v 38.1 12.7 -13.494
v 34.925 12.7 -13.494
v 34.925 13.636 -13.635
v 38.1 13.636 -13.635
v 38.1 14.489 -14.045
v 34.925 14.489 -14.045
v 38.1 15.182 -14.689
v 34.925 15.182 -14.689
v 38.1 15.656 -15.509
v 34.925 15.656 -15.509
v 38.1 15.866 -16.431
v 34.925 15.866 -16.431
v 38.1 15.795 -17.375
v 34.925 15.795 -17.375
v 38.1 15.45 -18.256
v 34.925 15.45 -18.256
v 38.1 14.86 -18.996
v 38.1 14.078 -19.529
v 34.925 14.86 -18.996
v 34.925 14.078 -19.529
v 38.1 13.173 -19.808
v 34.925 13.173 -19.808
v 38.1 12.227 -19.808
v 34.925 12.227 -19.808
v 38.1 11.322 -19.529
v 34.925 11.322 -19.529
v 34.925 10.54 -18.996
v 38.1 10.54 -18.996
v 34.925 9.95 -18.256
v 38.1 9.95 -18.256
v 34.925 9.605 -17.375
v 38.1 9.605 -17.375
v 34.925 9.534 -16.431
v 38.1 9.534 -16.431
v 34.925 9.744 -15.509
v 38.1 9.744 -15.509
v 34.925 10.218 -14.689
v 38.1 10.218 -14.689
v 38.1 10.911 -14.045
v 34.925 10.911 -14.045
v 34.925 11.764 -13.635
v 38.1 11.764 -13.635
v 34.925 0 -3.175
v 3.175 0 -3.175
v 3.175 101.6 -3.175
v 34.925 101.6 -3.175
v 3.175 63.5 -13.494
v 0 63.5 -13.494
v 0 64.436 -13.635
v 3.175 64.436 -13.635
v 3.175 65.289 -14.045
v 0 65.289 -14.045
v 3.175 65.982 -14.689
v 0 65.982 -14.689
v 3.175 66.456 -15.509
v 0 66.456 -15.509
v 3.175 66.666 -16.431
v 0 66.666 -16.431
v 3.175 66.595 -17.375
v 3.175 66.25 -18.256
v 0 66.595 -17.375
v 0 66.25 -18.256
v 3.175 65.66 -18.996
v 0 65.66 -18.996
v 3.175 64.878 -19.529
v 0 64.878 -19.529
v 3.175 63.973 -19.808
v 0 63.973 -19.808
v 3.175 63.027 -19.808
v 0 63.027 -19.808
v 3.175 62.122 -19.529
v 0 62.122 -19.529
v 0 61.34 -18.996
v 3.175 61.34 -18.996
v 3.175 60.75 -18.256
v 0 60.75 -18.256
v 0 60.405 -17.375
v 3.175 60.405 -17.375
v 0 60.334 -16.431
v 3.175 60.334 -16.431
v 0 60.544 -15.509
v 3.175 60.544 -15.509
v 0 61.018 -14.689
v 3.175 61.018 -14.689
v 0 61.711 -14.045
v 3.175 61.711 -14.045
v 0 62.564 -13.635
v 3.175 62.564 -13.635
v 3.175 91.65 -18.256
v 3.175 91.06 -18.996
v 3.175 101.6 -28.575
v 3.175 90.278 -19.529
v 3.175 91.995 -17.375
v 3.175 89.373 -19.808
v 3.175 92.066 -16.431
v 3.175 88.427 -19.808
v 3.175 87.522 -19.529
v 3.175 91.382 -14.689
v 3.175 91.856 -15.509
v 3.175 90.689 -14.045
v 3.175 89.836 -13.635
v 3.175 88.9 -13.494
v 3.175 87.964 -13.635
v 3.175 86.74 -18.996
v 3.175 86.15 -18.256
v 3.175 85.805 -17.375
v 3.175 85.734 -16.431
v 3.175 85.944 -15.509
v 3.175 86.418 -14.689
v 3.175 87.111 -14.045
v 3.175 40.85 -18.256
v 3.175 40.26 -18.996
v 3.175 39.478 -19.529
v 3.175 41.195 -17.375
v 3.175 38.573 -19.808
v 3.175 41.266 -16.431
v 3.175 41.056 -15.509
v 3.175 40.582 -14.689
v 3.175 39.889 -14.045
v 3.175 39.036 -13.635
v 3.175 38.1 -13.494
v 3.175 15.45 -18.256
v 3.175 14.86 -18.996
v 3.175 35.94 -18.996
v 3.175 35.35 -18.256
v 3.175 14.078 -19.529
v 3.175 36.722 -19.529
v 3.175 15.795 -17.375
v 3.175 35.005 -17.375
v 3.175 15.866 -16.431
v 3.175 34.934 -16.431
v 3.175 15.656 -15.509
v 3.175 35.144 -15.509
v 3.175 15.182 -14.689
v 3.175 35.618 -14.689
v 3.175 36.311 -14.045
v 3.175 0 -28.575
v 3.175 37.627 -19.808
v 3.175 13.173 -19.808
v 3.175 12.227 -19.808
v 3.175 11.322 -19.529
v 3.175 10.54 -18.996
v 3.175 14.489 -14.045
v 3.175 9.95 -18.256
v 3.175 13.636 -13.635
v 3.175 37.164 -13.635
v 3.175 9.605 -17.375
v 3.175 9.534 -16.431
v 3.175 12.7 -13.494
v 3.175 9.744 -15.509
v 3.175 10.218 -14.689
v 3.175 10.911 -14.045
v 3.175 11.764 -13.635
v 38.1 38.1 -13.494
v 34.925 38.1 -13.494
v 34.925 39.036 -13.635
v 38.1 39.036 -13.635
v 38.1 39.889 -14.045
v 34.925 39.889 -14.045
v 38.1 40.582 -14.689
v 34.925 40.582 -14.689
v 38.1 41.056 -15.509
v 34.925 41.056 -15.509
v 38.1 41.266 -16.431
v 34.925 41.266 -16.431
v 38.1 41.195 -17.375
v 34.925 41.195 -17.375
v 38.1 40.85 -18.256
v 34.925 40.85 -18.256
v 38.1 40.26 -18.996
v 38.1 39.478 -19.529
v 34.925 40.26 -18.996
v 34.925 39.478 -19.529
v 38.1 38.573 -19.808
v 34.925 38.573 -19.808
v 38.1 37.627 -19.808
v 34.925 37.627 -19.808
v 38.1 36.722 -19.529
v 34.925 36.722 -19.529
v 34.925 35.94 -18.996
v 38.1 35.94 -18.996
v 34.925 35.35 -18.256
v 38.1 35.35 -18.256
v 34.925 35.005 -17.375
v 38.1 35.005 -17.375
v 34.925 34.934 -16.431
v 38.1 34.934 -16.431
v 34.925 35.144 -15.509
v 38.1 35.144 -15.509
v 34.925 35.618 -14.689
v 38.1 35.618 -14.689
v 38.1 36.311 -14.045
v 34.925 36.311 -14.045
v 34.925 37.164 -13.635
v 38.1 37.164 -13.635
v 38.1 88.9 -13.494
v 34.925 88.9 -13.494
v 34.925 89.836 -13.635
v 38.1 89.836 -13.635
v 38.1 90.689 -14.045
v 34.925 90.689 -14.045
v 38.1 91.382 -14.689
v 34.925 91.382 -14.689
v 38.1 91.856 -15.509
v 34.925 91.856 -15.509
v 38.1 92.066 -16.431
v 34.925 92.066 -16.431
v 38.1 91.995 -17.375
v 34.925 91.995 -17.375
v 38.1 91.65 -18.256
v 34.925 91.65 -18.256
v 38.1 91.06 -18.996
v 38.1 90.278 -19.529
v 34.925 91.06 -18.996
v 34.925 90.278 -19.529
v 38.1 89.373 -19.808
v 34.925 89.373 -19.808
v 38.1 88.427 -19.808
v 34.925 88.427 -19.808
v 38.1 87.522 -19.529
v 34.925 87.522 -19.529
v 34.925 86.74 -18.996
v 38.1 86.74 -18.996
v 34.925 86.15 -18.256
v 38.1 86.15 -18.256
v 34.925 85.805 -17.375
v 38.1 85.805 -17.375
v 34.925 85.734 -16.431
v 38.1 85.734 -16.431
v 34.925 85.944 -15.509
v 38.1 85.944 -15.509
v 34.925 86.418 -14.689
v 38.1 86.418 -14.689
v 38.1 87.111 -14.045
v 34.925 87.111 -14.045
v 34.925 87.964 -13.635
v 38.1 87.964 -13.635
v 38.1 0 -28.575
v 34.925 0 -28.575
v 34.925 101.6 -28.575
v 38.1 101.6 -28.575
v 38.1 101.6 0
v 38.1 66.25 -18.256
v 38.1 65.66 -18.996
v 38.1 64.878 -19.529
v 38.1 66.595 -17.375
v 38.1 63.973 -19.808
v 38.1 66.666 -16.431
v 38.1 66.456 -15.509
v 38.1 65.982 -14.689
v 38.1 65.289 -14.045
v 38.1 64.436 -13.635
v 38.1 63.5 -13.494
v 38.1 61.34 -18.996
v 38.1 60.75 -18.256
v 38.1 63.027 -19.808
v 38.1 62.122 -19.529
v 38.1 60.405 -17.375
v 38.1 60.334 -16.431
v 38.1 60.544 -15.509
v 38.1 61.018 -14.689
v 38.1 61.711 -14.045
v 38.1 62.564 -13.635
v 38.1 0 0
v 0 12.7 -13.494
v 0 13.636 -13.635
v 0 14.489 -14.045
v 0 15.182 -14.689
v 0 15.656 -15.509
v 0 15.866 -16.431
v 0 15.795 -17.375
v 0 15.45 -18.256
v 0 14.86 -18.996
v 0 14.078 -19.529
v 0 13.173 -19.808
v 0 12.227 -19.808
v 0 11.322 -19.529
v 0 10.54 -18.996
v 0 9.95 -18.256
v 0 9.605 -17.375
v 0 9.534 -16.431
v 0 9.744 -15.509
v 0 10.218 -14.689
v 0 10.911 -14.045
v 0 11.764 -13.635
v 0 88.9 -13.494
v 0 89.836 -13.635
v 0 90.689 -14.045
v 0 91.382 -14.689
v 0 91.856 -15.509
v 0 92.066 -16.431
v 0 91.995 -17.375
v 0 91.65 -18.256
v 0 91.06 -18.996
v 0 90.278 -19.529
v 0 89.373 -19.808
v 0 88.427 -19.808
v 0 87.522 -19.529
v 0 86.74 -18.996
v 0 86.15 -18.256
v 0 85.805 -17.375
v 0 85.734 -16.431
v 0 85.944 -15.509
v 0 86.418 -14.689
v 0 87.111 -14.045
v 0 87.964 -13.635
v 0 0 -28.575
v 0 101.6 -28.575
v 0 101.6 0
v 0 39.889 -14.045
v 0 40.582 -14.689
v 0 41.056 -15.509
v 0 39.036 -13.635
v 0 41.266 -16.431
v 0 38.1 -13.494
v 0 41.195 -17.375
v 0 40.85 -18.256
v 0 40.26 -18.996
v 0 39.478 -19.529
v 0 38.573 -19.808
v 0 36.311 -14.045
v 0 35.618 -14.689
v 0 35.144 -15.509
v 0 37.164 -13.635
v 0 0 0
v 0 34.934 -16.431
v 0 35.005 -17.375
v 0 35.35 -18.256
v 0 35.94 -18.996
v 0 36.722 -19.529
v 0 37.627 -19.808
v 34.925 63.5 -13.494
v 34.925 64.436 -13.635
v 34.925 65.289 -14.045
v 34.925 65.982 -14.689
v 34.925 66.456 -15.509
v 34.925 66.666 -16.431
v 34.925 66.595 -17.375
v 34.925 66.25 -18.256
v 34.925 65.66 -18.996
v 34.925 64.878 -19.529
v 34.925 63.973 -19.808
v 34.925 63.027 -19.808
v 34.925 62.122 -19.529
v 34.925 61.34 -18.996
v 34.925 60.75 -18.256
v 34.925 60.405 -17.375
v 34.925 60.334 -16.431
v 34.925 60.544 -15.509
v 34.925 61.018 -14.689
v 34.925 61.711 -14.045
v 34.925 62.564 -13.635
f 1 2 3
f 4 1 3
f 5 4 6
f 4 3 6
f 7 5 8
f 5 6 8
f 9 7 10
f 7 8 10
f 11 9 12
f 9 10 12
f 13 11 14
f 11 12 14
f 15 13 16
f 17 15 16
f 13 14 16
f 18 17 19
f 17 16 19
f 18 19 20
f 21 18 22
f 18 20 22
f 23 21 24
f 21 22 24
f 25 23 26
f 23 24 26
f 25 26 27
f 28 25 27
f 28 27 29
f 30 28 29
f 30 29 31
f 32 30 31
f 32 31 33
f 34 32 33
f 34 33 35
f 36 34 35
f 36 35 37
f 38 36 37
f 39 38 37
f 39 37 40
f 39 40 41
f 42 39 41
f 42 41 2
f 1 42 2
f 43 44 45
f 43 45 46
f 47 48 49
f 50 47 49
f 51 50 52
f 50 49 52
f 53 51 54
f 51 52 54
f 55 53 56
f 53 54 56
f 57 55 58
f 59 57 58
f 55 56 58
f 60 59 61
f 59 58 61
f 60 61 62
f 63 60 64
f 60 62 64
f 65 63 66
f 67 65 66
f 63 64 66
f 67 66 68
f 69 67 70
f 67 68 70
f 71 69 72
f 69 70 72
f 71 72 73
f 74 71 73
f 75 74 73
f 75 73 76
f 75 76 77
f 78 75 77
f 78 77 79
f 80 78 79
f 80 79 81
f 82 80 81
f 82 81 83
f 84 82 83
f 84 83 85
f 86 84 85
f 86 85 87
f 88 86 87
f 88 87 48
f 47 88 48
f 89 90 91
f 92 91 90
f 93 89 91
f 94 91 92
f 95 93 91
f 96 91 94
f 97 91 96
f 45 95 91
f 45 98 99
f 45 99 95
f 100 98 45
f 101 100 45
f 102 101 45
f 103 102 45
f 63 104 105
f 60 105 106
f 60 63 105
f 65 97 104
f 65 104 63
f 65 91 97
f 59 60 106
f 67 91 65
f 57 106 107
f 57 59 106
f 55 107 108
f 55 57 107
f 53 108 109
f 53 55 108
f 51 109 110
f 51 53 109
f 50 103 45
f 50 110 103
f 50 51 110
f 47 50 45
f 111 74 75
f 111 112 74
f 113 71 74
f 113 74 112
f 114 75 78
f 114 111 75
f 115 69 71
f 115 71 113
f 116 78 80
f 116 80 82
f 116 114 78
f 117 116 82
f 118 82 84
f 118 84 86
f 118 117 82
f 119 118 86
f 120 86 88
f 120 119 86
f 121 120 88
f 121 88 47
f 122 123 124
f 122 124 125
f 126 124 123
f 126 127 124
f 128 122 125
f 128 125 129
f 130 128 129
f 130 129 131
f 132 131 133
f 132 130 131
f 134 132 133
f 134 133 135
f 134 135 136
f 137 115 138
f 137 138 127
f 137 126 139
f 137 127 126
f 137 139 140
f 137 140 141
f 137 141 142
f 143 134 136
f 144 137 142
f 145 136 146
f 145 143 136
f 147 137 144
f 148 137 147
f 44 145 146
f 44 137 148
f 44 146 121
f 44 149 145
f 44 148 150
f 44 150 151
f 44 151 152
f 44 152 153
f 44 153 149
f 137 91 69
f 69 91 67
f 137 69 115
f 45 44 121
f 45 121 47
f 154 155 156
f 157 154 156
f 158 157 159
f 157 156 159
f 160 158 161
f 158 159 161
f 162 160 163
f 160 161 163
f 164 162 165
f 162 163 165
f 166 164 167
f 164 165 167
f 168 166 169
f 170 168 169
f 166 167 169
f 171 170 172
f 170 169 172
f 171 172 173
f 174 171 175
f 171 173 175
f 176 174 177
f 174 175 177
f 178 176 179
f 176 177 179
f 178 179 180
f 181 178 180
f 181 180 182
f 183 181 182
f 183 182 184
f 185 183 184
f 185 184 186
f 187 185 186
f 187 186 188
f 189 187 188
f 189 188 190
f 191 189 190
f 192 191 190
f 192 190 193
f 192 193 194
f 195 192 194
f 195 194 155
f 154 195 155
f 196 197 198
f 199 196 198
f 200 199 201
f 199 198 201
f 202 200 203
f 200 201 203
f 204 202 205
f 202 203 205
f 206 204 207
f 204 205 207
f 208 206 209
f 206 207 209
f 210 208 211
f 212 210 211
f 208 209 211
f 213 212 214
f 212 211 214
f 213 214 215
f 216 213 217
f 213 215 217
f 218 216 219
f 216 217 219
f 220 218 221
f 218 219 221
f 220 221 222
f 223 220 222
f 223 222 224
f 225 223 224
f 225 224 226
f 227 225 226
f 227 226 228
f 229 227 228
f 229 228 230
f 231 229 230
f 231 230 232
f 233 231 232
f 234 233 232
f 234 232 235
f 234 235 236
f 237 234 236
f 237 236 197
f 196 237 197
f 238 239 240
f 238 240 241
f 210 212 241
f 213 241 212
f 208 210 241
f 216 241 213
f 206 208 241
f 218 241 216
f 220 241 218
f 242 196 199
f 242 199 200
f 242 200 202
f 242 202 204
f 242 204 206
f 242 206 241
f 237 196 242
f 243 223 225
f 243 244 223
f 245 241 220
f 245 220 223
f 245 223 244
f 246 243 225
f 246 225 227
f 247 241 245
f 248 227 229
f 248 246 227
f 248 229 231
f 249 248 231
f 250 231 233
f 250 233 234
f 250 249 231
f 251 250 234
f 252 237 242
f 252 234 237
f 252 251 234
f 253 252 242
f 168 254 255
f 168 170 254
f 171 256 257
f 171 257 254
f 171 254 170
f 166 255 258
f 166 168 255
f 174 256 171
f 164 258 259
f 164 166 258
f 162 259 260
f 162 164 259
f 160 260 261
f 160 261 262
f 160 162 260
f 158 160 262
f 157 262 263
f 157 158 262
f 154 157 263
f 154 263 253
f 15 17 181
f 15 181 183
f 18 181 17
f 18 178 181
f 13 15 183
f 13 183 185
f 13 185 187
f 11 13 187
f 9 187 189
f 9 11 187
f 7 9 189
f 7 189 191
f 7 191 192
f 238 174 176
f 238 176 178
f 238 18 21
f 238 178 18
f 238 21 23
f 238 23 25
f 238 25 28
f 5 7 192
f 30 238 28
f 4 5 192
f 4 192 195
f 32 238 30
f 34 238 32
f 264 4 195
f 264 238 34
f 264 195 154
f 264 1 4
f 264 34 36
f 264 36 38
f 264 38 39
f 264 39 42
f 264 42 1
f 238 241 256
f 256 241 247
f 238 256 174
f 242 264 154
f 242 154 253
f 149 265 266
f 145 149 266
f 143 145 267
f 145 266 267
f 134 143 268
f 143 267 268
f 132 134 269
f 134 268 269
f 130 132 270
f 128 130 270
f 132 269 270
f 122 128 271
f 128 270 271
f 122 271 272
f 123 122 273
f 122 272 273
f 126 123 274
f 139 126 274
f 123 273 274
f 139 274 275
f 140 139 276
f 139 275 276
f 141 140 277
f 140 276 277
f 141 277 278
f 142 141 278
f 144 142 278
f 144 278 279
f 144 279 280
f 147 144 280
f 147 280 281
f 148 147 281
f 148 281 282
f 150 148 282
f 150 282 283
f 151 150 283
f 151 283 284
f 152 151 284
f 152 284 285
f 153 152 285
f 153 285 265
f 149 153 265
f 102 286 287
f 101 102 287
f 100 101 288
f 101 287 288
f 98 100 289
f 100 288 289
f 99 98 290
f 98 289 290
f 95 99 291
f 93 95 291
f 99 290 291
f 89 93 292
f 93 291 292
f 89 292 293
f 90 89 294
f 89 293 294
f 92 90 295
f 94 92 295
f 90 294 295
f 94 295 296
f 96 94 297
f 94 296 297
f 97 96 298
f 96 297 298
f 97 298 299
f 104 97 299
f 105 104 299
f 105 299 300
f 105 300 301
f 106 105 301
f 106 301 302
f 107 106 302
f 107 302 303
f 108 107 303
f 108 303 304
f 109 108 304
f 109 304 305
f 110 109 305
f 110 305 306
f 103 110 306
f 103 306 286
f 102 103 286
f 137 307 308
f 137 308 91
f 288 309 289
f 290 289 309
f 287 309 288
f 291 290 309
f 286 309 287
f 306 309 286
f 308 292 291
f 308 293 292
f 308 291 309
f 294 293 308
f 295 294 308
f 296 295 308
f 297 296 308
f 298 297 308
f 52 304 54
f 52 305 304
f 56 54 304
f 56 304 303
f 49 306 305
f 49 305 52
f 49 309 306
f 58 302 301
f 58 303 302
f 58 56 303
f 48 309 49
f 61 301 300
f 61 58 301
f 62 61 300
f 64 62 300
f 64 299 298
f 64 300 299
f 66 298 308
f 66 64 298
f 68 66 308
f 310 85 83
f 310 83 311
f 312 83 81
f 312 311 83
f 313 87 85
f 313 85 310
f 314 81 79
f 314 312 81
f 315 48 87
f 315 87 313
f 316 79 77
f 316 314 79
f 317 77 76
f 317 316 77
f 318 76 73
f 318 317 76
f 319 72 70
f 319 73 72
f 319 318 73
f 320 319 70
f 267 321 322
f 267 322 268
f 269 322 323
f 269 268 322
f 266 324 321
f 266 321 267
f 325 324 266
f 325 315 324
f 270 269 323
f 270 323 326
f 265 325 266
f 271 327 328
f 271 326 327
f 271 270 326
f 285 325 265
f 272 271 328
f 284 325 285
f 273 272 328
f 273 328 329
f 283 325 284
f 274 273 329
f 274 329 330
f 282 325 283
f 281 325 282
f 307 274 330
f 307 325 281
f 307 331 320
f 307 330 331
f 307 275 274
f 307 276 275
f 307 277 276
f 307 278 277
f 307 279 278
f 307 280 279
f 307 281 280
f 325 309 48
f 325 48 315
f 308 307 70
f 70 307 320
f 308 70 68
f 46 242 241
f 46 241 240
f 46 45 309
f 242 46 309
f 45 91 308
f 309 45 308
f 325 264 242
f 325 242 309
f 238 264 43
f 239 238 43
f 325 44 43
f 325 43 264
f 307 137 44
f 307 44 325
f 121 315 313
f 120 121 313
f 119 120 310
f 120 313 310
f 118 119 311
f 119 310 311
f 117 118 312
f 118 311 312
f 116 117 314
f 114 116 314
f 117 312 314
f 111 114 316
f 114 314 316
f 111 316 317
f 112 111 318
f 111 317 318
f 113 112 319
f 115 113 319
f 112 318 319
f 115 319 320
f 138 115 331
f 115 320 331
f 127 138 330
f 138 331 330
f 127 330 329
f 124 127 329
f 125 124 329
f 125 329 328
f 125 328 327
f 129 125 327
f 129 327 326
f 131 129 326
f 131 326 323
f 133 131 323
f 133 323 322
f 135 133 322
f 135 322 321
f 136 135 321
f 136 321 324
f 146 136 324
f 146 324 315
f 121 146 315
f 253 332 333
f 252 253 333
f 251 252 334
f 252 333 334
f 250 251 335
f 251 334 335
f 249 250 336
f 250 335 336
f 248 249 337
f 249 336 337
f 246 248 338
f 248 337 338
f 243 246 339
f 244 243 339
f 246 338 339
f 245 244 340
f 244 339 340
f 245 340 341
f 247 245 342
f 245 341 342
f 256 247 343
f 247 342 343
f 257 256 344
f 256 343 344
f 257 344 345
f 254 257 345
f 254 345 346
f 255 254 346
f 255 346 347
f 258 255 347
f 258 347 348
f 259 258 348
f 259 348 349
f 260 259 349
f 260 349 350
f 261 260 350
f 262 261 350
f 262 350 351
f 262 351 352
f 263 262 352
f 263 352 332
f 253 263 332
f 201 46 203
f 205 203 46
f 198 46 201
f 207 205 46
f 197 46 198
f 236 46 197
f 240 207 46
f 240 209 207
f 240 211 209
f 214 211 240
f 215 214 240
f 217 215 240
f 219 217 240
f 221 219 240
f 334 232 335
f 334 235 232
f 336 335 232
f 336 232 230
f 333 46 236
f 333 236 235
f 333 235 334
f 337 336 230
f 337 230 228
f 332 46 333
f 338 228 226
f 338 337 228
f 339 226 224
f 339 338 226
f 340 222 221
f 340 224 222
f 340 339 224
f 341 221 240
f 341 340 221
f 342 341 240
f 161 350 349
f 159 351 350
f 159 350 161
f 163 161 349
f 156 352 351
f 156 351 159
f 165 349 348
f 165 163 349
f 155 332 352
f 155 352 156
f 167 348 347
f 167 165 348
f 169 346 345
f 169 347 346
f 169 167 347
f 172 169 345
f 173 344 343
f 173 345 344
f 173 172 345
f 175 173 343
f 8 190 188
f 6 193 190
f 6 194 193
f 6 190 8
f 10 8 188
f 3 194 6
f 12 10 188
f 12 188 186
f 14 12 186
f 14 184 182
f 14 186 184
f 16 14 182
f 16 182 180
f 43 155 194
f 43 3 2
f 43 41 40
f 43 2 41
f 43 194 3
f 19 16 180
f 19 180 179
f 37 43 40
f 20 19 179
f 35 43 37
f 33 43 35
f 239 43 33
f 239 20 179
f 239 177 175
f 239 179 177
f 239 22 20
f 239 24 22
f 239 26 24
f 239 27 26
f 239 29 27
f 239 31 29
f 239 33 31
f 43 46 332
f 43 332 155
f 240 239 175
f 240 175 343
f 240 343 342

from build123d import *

# Parameters (mm, degrees)
BOSS_EXTRUDE1_DEPTH = 101.6
SKETCH3_R           = 3.175
CUT_EXTRUDE1_DEPTH  = 113.208291249


with BuildPart() as part:
    # Sketch1 → Boss-Extrude1 (new body)
    with BuildSketch(Plane(origin=(0, 0, 0), x_dir=(1, 0, 0), z_dir=(0, 1, 0))):
        Polygon((0, 0), (0, 28.575), (3.175, 28.575), (3.175, 3.175), (34.925, 3.175), (34.925, 28.575), (38.1, 28.575), (38.1, 0), align=None)
    extrude(amount=BOSS_EXTRUDE1_DEPTH)

    # Sketch3 → Cut-Extrude1 (cut, through all)
    with BuildSketch(Plane.ZY):
        with Locations((-16.66875, 12.7)):
            Circle(SKETCH3_R)
        with Locations((-16.66875, 38.1)):
            Circle(SKETCH3_R)
        with Locations((-16.66875, 63.5)):
            Circle(SKETCH3_R)
        with Locations((-16.66875, 88.9)):
            Circle(SKETCH3_R)
    extrude(amount=-CUT_EXTRUDE1_DEPTH, mode=Mode.SUBTRACT)


solid = part.part
